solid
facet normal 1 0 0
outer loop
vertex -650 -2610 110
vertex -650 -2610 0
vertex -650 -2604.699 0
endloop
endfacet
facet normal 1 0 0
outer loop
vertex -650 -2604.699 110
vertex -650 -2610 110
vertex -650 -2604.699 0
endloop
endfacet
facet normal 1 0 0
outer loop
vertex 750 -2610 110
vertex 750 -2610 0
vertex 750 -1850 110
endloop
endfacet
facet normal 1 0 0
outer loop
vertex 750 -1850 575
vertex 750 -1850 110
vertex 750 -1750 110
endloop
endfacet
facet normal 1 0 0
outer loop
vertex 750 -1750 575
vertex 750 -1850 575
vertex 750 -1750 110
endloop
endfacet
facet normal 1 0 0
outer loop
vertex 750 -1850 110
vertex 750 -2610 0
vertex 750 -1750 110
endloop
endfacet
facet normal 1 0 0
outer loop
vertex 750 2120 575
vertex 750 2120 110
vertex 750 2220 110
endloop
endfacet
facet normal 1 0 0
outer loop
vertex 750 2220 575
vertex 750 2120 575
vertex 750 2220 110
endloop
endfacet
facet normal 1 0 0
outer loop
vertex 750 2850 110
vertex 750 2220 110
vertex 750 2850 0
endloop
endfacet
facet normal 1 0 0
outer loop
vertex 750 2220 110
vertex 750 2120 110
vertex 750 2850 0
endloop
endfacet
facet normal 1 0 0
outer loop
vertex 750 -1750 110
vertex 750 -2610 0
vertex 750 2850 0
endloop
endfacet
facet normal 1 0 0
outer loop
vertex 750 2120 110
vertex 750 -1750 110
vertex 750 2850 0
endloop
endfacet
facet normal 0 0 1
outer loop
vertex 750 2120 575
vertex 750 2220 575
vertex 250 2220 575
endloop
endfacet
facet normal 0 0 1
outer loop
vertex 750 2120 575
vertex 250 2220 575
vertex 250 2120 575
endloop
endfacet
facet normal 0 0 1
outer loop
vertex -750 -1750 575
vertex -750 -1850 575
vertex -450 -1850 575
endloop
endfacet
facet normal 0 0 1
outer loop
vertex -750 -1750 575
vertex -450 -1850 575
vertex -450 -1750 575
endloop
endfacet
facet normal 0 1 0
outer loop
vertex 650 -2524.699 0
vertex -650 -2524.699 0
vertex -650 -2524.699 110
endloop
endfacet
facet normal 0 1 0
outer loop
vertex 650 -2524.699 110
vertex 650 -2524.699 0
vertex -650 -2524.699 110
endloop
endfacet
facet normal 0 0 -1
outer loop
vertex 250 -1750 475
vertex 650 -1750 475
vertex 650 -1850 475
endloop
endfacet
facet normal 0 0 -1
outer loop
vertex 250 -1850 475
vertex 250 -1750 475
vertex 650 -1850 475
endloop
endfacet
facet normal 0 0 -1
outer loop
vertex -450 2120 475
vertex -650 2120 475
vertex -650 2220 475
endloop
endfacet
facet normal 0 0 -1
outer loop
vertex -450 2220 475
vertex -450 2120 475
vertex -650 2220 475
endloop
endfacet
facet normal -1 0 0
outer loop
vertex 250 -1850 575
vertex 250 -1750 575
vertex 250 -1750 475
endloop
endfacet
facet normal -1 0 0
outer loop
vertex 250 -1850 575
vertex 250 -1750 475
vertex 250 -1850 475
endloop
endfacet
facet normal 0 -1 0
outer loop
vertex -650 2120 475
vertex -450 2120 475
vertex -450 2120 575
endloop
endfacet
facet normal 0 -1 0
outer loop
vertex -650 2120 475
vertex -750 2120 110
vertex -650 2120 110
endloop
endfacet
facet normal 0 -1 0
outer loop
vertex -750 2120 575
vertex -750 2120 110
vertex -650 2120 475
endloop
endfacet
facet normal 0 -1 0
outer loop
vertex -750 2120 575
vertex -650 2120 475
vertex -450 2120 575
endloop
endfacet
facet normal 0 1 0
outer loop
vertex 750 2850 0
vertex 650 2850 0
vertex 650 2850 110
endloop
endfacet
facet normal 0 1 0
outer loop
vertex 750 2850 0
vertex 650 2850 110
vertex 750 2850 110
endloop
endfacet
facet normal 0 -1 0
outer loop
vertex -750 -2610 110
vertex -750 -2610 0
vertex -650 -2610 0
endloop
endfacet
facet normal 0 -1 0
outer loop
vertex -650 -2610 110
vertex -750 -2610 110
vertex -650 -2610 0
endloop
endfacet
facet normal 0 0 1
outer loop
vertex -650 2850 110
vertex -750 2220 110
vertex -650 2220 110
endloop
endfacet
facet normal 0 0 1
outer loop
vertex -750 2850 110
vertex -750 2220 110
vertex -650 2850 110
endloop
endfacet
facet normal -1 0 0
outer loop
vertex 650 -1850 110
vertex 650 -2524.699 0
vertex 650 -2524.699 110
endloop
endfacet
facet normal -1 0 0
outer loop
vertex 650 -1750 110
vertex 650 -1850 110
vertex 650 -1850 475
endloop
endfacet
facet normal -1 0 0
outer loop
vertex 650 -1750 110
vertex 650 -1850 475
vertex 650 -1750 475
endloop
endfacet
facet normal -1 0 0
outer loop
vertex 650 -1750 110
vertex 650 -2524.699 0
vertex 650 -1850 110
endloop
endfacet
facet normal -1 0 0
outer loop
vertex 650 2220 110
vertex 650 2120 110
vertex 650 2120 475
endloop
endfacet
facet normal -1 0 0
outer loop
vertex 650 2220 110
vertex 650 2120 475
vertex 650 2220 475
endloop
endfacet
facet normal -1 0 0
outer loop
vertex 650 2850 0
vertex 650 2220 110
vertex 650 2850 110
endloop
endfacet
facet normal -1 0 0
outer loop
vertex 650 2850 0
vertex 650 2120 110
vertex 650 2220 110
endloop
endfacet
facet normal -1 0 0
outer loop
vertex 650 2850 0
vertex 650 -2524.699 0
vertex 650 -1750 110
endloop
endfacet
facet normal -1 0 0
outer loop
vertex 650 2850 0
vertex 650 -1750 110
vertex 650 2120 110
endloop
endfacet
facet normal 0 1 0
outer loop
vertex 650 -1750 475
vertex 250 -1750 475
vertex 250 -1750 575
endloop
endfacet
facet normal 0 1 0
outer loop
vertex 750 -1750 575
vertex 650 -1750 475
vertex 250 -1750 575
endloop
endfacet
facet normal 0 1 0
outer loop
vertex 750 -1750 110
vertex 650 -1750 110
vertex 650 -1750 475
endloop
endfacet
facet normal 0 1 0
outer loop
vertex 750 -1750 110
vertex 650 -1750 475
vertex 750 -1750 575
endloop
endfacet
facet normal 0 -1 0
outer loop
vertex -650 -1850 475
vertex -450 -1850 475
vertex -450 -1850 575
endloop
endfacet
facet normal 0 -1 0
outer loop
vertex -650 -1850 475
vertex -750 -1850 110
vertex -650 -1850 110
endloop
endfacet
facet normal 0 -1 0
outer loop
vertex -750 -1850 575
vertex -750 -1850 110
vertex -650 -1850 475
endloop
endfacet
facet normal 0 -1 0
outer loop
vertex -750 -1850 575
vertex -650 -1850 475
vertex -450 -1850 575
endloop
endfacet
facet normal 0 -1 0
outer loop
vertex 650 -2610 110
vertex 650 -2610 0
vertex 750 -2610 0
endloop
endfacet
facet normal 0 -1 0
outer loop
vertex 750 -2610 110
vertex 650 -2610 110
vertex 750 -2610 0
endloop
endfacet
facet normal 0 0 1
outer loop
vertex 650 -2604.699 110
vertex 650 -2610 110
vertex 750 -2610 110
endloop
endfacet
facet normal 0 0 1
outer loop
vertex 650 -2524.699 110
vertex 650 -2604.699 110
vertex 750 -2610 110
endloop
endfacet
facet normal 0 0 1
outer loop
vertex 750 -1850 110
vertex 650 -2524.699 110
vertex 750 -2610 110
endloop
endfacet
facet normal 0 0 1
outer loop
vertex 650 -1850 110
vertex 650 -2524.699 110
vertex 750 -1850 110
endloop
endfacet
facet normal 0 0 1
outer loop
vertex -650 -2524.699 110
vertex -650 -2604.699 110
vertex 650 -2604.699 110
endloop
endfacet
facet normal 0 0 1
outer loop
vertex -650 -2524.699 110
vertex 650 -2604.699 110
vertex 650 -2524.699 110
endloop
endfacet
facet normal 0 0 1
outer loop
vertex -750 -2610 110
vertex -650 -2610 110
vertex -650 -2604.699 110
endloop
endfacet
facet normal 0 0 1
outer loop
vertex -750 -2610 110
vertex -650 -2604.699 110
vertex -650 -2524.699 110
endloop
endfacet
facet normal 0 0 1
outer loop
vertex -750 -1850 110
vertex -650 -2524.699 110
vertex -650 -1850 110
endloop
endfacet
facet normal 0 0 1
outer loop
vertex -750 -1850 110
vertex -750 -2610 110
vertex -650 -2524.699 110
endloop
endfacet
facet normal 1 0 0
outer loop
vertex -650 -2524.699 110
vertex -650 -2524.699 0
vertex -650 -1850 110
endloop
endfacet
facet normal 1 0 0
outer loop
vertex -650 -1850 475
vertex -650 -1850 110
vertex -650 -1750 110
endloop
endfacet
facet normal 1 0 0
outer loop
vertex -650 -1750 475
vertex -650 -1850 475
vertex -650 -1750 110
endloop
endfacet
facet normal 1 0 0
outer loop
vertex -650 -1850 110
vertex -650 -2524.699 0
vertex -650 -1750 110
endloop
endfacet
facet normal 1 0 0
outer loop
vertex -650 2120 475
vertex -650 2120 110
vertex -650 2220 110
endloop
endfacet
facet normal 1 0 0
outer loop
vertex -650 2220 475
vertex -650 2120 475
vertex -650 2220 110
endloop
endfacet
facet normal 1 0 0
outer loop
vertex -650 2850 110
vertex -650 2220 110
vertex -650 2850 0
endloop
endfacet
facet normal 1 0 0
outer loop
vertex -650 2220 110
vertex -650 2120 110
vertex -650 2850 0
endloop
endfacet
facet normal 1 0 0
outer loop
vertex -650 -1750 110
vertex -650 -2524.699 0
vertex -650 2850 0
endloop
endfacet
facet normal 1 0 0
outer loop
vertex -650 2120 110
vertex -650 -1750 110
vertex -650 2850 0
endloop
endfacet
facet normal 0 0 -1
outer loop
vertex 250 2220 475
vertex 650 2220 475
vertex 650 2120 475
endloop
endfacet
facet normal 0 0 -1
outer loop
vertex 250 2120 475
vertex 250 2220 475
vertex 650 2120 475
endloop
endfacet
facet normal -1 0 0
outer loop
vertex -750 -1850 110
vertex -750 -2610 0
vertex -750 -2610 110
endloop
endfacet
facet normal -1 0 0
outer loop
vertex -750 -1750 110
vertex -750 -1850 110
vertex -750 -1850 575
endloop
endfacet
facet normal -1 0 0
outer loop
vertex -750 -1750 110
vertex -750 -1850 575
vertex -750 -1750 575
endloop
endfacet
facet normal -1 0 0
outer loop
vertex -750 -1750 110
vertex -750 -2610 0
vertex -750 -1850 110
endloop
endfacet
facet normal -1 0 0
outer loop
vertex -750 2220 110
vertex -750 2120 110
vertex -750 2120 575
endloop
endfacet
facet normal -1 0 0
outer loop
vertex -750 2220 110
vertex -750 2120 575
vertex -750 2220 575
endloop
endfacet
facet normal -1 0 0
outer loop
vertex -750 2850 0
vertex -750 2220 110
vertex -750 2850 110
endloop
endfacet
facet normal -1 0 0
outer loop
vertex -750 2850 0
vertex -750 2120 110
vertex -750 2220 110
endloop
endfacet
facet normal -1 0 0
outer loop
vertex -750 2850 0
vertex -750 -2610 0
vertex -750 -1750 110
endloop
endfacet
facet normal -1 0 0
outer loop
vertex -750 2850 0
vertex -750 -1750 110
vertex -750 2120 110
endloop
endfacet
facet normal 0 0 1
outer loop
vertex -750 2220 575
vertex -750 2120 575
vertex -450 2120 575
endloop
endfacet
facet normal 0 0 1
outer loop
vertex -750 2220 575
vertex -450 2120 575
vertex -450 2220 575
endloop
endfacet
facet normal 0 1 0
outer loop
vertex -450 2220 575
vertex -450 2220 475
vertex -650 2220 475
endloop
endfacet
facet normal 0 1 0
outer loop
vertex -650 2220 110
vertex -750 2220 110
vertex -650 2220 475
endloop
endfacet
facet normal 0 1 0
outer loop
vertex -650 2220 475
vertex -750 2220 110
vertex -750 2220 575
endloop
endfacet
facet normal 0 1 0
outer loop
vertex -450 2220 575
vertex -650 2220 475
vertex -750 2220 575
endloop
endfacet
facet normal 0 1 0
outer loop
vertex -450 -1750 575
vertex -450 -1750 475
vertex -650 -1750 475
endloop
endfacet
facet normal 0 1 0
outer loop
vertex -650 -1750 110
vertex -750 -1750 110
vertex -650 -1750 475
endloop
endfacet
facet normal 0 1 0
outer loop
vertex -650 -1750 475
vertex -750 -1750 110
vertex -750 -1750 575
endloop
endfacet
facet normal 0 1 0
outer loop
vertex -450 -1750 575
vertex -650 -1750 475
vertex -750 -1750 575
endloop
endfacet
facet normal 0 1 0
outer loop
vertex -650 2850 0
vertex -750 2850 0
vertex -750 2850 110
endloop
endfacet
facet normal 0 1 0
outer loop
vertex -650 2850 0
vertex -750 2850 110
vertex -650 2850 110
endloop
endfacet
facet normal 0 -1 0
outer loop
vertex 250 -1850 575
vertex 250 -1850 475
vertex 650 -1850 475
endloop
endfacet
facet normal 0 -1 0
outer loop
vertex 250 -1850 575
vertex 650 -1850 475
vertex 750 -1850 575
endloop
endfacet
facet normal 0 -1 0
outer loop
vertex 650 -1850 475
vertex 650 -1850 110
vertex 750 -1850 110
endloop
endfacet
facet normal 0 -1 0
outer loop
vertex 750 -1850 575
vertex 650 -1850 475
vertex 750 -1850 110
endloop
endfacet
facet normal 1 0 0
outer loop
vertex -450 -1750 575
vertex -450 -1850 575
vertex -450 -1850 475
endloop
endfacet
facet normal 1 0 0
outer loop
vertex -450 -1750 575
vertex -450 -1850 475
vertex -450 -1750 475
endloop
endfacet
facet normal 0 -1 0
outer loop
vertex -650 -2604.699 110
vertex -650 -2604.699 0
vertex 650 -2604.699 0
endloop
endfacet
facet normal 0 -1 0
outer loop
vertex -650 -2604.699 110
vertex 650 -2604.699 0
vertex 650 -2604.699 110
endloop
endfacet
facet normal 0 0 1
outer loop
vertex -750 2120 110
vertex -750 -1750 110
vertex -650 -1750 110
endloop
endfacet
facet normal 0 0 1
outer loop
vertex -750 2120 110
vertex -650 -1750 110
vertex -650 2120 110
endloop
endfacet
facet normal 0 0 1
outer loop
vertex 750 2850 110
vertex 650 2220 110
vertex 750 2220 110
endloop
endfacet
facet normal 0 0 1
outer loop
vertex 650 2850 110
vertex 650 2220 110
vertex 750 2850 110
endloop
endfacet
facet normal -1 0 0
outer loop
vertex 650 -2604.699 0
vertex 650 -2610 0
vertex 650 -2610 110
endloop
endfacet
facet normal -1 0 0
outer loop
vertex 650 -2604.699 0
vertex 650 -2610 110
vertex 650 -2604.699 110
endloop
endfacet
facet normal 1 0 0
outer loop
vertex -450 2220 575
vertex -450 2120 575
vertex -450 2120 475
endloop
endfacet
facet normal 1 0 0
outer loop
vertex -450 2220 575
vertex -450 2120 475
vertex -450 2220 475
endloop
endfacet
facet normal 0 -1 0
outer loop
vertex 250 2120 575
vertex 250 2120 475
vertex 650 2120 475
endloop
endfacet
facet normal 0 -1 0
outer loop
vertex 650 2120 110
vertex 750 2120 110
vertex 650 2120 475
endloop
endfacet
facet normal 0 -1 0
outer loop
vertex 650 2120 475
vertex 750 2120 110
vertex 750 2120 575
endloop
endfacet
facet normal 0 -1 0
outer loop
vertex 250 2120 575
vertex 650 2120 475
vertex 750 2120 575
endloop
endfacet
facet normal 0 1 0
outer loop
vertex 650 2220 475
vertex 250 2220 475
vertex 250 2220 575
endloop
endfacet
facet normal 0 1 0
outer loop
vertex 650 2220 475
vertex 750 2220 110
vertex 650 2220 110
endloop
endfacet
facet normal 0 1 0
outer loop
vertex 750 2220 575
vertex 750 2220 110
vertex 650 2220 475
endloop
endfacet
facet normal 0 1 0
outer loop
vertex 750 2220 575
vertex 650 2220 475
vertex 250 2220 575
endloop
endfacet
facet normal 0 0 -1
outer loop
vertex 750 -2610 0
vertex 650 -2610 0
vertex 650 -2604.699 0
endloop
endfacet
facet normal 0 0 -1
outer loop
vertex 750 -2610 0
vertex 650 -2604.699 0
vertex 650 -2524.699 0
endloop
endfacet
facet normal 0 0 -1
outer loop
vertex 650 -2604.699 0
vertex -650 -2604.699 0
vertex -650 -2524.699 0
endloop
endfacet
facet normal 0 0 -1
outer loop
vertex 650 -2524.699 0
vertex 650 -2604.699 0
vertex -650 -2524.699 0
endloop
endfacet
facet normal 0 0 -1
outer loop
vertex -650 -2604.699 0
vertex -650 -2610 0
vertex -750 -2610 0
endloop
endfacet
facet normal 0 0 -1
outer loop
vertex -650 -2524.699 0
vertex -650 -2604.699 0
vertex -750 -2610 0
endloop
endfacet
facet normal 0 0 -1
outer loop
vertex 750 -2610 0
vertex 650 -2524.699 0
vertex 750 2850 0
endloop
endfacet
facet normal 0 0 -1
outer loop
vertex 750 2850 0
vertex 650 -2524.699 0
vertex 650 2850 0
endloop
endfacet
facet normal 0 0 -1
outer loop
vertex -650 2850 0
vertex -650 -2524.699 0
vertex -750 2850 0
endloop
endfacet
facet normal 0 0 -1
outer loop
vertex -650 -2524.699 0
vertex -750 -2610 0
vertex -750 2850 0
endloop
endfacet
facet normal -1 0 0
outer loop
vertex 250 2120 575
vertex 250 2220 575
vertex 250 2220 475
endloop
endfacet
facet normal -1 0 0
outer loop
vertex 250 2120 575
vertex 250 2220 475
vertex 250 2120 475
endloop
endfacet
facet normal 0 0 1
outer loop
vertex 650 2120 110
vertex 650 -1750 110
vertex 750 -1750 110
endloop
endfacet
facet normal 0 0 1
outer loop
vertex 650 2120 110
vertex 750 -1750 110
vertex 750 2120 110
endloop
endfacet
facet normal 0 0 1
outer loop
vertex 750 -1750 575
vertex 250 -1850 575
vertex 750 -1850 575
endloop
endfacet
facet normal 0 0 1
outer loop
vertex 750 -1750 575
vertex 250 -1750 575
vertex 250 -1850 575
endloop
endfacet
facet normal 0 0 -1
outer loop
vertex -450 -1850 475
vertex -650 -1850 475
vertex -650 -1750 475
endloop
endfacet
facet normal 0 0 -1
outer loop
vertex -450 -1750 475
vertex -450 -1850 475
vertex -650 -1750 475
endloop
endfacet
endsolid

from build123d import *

# Parameters (mm, degrees)
F0_W      = 100
F0_H      = 5700
F1_DEPTH  = 110
F2_W      = 80
F2_H      = 110
F3_DEPTH  = 1350
F4_W      = 100
F4_H      = 100
F5_DEPTH  = 465
F6_DEPTH  = 240
F7_W      = 100
F7_H      = 100
F8_DEPTH  = 200
F9_W      = 100
F9_H      = 100
F10_DEPTH = 400
F11_W     = 100
F11_H     = 100
F12_DEPTH = 200


with BuildPart() as f1:
    # F0 (on Top) → F1 (new body)
    with BuildSketch(Plane.XY):
        with Locations((700, 0)):
            Rectangle(F0_W, F0_H)
    extrude(amount=F1_DEPTH)



with BuildPart() as f1b:
    # F0 (on Top) → F1, piece 2 (new body)
    with BuildSketch(Plane.XY):
        with Locations((-700, 0)):
            Rectangle(F0_W, F0_H)
    extrude(amount=F1_DEPTH)


with BuildPart() as f1_1:
    add(f1.part)

    add(f1b.part)  # F3 merges F1b
    # F2 (on face) → F3 (join)
    with BuildSketch(Plane.YZ.offset(-650)):
        with Locations((-2564.6993732452, 55)):
            Rectangle(F2_W, F2_H)
    extrude(amount=F3_DEPTH)

    # F4 (on face) → F5 (join)
    with BuildSketch(Plane.XY.offset(110)):
        with Locations((700, -1800)):
            Rectangle(F4_W, F4_H)
        with Locations((700, 2170)):
            Rectangle(F4_W, F4_H)
        with Locations((-700, -1800)):
            Rectangle(F4_W, F4_H)
        with Locations((-700, 2170)):
            Rectangle(F4_W, F4_H)
    extrude(amount=F5_DEPTH)

    # F6 (cut): faces of the model
    f6_faces = [f1_1.faces().sort_by_distance(p)[0] for p in [
        (700, -2850, 55),
        (-700, -2850, 55),
    ]]
    extrude(f6_faces, amount=-F6_DEPTH, mode=Mode.SUBTRACT)

    # F7 (on face) → F8 (join)
    with BuildSketch(Plane.YZ.offset(-650)):
        with Locations((2170, 525)):
            Rectangle(F7_W, F7_H)
    extrude(amount=F8_DEPTH)

    # F9 (on face) → F10 (join)
    with BuildSketch(Plane(origin=(650, 0, 0), x_dir=(0, -1, 0), z_dir=(-1, 0, 0))):
        with Locations((-2170, 525)):
            Rectangle(F9_W, F9_H)
        with Locations((1800, 525)):
            Rectangle(F9_W, F9_H)
    extrude(amount=F10_DEPTH)

    # F11 (on face) → F12 (join)
    with BuildSketch(Plane.YZ.offset(-650)):
        with Locations((-1800, 525)):
            Rectangle(F11_W, F11_H)
    extrude(amount=F12_DEPTH)


solid = f1_1.part
